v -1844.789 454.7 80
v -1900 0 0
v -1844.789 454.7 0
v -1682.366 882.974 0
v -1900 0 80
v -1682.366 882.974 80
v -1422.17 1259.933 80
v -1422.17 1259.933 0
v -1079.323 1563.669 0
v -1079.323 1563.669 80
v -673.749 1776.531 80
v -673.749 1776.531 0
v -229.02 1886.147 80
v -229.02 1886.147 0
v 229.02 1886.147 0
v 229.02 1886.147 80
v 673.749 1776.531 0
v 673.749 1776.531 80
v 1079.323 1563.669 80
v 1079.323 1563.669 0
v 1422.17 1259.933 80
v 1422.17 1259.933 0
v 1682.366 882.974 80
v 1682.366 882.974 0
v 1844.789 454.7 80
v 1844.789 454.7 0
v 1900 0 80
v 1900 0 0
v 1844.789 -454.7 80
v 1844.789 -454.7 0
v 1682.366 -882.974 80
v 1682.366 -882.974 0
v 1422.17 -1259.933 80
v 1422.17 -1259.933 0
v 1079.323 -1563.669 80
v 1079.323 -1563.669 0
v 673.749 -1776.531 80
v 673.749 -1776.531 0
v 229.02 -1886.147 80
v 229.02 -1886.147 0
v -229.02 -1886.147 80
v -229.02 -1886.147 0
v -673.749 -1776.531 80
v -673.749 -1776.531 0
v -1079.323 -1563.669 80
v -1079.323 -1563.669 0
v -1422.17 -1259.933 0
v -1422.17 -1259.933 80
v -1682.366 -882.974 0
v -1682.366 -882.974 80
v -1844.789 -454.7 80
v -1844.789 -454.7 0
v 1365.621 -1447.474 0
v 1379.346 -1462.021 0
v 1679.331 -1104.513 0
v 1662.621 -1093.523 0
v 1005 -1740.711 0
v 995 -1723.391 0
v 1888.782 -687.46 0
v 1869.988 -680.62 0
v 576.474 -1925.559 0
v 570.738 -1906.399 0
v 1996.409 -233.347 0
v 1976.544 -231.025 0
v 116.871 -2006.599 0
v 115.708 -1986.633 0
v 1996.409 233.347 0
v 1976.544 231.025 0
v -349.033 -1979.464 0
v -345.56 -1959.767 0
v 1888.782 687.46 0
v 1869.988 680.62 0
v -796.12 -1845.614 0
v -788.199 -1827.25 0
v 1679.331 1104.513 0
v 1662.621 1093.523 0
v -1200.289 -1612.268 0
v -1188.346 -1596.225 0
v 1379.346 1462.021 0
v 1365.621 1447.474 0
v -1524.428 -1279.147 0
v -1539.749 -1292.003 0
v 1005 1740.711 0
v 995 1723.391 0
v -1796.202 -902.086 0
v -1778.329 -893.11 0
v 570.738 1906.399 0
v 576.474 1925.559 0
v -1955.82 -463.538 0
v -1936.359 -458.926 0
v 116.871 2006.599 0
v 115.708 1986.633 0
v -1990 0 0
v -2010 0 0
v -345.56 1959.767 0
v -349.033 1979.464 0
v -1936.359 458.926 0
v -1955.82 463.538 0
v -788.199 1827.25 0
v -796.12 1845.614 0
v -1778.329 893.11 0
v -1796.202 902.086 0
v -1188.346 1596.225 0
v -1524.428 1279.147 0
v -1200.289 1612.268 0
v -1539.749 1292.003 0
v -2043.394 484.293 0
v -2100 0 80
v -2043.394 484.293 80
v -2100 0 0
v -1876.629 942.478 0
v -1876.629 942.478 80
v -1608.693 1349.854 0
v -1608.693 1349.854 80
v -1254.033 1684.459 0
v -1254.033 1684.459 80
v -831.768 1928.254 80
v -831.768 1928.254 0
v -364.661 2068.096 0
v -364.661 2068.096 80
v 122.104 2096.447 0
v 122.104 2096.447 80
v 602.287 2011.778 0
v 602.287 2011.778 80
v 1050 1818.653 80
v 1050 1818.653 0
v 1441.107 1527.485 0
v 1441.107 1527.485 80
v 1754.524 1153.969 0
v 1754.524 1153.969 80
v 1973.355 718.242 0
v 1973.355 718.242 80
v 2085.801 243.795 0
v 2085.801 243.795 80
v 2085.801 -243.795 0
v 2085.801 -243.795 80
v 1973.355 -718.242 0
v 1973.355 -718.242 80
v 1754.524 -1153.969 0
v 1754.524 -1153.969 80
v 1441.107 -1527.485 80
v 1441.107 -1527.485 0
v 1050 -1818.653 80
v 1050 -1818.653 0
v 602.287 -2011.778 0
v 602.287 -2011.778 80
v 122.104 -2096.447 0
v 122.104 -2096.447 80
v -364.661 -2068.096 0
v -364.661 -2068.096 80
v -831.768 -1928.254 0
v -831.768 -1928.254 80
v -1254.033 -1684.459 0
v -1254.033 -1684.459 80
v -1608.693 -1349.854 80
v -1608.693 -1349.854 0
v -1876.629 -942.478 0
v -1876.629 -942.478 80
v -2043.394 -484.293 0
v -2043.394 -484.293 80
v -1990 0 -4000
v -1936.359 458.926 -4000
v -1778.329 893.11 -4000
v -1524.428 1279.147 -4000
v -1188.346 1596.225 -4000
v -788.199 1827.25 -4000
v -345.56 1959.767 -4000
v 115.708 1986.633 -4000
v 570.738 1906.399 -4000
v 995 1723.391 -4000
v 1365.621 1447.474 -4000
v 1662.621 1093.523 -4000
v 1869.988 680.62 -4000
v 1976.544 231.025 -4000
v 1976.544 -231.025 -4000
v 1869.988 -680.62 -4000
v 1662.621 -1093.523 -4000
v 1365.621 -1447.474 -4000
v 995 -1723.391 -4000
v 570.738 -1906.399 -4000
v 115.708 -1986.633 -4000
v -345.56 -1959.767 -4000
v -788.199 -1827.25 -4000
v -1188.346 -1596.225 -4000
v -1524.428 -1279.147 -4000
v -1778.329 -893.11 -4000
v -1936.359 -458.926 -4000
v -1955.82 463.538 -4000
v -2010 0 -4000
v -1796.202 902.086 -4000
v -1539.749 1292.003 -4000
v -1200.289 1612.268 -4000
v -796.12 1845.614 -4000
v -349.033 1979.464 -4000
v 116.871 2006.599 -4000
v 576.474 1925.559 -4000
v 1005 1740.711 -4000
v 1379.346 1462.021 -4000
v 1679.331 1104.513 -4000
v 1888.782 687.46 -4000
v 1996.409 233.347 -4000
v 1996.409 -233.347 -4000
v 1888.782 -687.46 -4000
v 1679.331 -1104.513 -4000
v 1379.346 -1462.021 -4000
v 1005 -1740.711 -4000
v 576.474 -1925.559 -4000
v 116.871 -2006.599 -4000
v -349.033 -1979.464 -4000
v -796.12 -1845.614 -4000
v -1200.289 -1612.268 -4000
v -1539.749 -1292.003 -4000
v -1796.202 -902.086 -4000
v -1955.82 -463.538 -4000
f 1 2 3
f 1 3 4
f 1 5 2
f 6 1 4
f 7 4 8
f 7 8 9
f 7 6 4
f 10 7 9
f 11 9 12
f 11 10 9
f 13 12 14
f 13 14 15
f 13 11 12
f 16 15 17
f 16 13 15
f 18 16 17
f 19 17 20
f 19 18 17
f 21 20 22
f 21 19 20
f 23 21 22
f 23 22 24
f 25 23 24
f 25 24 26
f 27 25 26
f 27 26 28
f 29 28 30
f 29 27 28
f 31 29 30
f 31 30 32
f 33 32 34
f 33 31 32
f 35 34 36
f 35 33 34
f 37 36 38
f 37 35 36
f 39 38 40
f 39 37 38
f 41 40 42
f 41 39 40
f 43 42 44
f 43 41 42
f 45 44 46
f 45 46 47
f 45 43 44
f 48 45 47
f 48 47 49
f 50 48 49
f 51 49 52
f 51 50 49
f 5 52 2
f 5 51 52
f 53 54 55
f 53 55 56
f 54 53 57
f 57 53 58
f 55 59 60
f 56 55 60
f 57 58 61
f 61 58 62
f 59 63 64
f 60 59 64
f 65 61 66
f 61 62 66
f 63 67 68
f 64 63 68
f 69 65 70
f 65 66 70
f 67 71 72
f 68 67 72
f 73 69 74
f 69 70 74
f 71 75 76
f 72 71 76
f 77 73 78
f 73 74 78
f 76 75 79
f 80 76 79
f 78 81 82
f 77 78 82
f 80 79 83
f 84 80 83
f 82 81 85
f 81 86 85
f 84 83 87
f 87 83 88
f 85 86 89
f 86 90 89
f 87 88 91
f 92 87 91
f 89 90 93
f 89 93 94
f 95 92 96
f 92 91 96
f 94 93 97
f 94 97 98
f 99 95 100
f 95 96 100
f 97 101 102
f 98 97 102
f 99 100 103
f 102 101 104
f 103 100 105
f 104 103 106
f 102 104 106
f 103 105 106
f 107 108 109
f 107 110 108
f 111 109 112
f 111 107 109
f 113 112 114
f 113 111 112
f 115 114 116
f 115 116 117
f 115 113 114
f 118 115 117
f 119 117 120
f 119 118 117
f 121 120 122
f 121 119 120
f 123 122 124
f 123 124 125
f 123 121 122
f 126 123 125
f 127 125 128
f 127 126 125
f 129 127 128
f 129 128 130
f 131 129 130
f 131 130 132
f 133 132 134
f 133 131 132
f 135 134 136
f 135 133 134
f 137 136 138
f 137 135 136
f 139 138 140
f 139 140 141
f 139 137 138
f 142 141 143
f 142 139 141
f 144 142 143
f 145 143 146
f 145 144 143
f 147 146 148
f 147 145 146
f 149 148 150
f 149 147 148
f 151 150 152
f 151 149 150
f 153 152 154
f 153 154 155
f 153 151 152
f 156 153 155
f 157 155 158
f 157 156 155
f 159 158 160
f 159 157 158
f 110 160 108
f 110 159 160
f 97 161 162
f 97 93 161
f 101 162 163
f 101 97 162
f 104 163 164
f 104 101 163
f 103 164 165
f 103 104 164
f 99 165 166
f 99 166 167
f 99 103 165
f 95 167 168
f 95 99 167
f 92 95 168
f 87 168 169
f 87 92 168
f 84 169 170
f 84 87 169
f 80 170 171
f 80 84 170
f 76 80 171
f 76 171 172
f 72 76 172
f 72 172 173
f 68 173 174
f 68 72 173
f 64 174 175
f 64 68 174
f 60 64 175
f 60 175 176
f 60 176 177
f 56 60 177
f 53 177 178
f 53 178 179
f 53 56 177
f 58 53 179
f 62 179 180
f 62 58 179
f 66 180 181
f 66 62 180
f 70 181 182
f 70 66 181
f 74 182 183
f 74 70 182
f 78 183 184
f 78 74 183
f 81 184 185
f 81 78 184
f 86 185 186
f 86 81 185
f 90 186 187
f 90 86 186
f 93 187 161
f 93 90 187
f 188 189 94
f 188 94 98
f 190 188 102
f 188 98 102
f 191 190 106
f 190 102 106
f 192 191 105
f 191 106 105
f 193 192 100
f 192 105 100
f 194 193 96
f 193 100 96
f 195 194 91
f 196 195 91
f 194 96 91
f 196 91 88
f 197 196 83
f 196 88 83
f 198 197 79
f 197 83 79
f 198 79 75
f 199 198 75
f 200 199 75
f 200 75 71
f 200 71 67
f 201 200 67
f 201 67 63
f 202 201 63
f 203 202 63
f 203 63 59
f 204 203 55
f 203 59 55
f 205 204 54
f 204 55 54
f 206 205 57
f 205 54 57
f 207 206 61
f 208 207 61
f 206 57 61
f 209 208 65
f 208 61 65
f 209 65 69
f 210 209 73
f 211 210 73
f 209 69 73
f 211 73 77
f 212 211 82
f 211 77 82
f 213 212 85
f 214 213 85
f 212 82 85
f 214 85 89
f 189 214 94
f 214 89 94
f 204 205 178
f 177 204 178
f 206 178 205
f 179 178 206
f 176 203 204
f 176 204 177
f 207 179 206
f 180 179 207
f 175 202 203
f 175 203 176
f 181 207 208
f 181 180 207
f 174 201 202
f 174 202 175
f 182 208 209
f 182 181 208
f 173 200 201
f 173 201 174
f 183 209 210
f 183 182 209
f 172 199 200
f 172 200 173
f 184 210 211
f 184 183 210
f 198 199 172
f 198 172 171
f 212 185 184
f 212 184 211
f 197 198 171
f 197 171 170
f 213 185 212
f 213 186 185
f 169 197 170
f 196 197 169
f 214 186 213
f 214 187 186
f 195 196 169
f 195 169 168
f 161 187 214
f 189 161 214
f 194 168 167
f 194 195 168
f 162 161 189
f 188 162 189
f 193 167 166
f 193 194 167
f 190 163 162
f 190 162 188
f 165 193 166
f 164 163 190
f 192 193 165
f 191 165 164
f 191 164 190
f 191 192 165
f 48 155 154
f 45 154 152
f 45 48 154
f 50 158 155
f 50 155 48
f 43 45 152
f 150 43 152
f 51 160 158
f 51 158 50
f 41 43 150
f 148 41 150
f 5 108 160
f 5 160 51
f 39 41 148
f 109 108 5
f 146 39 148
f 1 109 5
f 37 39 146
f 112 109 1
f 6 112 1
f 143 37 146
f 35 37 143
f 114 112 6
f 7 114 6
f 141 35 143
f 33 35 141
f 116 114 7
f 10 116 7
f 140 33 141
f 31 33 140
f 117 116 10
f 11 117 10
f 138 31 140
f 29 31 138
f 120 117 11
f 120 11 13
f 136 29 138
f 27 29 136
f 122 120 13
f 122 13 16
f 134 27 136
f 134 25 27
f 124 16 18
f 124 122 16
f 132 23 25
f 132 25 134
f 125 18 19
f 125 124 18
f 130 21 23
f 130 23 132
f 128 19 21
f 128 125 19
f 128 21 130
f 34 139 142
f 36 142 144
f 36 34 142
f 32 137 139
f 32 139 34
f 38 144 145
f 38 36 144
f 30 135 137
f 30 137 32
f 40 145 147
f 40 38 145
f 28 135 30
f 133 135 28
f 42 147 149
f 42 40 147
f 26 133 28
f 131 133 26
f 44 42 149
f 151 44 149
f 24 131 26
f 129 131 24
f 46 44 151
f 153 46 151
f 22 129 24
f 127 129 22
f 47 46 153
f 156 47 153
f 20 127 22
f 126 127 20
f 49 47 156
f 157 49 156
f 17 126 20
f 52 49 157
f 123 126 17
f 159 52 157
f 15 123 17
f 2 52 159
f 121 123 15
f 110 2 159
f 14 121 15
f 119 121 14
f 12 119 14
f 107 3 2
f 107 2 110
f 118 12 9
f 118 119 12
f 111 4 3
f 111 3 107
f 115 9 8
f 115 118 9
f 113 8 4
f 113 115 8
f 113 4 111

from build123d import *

# Parameters (mm, degrees)
F0_W = 20
F0_H = 4000


with BuildPart() as f1:
    # F0 (on Front) → F1 (revolve)
    with BuildSketch(Plane.XZ):
        Polygon((-2100, 0), (-2010, 0), (-1990, 0), (-1900, 0), (-1900, 80), (-2100, 80), align=None)
    revolve(axis=Axis((0, 0, -250), (0, 0, -1)))


with BuildPart() as f2:
    # F0 (on Front) → F2 (revolve)
    with BuildSketch(Plane.XZ):
        with Locations((-2000, -2000)):
            Rectangle(F0_W, F0_H)
    revolve(axis=Axis((0, 0, -250), (0, 0, -1)))


solid = Compound([f1.part, f2.part])
